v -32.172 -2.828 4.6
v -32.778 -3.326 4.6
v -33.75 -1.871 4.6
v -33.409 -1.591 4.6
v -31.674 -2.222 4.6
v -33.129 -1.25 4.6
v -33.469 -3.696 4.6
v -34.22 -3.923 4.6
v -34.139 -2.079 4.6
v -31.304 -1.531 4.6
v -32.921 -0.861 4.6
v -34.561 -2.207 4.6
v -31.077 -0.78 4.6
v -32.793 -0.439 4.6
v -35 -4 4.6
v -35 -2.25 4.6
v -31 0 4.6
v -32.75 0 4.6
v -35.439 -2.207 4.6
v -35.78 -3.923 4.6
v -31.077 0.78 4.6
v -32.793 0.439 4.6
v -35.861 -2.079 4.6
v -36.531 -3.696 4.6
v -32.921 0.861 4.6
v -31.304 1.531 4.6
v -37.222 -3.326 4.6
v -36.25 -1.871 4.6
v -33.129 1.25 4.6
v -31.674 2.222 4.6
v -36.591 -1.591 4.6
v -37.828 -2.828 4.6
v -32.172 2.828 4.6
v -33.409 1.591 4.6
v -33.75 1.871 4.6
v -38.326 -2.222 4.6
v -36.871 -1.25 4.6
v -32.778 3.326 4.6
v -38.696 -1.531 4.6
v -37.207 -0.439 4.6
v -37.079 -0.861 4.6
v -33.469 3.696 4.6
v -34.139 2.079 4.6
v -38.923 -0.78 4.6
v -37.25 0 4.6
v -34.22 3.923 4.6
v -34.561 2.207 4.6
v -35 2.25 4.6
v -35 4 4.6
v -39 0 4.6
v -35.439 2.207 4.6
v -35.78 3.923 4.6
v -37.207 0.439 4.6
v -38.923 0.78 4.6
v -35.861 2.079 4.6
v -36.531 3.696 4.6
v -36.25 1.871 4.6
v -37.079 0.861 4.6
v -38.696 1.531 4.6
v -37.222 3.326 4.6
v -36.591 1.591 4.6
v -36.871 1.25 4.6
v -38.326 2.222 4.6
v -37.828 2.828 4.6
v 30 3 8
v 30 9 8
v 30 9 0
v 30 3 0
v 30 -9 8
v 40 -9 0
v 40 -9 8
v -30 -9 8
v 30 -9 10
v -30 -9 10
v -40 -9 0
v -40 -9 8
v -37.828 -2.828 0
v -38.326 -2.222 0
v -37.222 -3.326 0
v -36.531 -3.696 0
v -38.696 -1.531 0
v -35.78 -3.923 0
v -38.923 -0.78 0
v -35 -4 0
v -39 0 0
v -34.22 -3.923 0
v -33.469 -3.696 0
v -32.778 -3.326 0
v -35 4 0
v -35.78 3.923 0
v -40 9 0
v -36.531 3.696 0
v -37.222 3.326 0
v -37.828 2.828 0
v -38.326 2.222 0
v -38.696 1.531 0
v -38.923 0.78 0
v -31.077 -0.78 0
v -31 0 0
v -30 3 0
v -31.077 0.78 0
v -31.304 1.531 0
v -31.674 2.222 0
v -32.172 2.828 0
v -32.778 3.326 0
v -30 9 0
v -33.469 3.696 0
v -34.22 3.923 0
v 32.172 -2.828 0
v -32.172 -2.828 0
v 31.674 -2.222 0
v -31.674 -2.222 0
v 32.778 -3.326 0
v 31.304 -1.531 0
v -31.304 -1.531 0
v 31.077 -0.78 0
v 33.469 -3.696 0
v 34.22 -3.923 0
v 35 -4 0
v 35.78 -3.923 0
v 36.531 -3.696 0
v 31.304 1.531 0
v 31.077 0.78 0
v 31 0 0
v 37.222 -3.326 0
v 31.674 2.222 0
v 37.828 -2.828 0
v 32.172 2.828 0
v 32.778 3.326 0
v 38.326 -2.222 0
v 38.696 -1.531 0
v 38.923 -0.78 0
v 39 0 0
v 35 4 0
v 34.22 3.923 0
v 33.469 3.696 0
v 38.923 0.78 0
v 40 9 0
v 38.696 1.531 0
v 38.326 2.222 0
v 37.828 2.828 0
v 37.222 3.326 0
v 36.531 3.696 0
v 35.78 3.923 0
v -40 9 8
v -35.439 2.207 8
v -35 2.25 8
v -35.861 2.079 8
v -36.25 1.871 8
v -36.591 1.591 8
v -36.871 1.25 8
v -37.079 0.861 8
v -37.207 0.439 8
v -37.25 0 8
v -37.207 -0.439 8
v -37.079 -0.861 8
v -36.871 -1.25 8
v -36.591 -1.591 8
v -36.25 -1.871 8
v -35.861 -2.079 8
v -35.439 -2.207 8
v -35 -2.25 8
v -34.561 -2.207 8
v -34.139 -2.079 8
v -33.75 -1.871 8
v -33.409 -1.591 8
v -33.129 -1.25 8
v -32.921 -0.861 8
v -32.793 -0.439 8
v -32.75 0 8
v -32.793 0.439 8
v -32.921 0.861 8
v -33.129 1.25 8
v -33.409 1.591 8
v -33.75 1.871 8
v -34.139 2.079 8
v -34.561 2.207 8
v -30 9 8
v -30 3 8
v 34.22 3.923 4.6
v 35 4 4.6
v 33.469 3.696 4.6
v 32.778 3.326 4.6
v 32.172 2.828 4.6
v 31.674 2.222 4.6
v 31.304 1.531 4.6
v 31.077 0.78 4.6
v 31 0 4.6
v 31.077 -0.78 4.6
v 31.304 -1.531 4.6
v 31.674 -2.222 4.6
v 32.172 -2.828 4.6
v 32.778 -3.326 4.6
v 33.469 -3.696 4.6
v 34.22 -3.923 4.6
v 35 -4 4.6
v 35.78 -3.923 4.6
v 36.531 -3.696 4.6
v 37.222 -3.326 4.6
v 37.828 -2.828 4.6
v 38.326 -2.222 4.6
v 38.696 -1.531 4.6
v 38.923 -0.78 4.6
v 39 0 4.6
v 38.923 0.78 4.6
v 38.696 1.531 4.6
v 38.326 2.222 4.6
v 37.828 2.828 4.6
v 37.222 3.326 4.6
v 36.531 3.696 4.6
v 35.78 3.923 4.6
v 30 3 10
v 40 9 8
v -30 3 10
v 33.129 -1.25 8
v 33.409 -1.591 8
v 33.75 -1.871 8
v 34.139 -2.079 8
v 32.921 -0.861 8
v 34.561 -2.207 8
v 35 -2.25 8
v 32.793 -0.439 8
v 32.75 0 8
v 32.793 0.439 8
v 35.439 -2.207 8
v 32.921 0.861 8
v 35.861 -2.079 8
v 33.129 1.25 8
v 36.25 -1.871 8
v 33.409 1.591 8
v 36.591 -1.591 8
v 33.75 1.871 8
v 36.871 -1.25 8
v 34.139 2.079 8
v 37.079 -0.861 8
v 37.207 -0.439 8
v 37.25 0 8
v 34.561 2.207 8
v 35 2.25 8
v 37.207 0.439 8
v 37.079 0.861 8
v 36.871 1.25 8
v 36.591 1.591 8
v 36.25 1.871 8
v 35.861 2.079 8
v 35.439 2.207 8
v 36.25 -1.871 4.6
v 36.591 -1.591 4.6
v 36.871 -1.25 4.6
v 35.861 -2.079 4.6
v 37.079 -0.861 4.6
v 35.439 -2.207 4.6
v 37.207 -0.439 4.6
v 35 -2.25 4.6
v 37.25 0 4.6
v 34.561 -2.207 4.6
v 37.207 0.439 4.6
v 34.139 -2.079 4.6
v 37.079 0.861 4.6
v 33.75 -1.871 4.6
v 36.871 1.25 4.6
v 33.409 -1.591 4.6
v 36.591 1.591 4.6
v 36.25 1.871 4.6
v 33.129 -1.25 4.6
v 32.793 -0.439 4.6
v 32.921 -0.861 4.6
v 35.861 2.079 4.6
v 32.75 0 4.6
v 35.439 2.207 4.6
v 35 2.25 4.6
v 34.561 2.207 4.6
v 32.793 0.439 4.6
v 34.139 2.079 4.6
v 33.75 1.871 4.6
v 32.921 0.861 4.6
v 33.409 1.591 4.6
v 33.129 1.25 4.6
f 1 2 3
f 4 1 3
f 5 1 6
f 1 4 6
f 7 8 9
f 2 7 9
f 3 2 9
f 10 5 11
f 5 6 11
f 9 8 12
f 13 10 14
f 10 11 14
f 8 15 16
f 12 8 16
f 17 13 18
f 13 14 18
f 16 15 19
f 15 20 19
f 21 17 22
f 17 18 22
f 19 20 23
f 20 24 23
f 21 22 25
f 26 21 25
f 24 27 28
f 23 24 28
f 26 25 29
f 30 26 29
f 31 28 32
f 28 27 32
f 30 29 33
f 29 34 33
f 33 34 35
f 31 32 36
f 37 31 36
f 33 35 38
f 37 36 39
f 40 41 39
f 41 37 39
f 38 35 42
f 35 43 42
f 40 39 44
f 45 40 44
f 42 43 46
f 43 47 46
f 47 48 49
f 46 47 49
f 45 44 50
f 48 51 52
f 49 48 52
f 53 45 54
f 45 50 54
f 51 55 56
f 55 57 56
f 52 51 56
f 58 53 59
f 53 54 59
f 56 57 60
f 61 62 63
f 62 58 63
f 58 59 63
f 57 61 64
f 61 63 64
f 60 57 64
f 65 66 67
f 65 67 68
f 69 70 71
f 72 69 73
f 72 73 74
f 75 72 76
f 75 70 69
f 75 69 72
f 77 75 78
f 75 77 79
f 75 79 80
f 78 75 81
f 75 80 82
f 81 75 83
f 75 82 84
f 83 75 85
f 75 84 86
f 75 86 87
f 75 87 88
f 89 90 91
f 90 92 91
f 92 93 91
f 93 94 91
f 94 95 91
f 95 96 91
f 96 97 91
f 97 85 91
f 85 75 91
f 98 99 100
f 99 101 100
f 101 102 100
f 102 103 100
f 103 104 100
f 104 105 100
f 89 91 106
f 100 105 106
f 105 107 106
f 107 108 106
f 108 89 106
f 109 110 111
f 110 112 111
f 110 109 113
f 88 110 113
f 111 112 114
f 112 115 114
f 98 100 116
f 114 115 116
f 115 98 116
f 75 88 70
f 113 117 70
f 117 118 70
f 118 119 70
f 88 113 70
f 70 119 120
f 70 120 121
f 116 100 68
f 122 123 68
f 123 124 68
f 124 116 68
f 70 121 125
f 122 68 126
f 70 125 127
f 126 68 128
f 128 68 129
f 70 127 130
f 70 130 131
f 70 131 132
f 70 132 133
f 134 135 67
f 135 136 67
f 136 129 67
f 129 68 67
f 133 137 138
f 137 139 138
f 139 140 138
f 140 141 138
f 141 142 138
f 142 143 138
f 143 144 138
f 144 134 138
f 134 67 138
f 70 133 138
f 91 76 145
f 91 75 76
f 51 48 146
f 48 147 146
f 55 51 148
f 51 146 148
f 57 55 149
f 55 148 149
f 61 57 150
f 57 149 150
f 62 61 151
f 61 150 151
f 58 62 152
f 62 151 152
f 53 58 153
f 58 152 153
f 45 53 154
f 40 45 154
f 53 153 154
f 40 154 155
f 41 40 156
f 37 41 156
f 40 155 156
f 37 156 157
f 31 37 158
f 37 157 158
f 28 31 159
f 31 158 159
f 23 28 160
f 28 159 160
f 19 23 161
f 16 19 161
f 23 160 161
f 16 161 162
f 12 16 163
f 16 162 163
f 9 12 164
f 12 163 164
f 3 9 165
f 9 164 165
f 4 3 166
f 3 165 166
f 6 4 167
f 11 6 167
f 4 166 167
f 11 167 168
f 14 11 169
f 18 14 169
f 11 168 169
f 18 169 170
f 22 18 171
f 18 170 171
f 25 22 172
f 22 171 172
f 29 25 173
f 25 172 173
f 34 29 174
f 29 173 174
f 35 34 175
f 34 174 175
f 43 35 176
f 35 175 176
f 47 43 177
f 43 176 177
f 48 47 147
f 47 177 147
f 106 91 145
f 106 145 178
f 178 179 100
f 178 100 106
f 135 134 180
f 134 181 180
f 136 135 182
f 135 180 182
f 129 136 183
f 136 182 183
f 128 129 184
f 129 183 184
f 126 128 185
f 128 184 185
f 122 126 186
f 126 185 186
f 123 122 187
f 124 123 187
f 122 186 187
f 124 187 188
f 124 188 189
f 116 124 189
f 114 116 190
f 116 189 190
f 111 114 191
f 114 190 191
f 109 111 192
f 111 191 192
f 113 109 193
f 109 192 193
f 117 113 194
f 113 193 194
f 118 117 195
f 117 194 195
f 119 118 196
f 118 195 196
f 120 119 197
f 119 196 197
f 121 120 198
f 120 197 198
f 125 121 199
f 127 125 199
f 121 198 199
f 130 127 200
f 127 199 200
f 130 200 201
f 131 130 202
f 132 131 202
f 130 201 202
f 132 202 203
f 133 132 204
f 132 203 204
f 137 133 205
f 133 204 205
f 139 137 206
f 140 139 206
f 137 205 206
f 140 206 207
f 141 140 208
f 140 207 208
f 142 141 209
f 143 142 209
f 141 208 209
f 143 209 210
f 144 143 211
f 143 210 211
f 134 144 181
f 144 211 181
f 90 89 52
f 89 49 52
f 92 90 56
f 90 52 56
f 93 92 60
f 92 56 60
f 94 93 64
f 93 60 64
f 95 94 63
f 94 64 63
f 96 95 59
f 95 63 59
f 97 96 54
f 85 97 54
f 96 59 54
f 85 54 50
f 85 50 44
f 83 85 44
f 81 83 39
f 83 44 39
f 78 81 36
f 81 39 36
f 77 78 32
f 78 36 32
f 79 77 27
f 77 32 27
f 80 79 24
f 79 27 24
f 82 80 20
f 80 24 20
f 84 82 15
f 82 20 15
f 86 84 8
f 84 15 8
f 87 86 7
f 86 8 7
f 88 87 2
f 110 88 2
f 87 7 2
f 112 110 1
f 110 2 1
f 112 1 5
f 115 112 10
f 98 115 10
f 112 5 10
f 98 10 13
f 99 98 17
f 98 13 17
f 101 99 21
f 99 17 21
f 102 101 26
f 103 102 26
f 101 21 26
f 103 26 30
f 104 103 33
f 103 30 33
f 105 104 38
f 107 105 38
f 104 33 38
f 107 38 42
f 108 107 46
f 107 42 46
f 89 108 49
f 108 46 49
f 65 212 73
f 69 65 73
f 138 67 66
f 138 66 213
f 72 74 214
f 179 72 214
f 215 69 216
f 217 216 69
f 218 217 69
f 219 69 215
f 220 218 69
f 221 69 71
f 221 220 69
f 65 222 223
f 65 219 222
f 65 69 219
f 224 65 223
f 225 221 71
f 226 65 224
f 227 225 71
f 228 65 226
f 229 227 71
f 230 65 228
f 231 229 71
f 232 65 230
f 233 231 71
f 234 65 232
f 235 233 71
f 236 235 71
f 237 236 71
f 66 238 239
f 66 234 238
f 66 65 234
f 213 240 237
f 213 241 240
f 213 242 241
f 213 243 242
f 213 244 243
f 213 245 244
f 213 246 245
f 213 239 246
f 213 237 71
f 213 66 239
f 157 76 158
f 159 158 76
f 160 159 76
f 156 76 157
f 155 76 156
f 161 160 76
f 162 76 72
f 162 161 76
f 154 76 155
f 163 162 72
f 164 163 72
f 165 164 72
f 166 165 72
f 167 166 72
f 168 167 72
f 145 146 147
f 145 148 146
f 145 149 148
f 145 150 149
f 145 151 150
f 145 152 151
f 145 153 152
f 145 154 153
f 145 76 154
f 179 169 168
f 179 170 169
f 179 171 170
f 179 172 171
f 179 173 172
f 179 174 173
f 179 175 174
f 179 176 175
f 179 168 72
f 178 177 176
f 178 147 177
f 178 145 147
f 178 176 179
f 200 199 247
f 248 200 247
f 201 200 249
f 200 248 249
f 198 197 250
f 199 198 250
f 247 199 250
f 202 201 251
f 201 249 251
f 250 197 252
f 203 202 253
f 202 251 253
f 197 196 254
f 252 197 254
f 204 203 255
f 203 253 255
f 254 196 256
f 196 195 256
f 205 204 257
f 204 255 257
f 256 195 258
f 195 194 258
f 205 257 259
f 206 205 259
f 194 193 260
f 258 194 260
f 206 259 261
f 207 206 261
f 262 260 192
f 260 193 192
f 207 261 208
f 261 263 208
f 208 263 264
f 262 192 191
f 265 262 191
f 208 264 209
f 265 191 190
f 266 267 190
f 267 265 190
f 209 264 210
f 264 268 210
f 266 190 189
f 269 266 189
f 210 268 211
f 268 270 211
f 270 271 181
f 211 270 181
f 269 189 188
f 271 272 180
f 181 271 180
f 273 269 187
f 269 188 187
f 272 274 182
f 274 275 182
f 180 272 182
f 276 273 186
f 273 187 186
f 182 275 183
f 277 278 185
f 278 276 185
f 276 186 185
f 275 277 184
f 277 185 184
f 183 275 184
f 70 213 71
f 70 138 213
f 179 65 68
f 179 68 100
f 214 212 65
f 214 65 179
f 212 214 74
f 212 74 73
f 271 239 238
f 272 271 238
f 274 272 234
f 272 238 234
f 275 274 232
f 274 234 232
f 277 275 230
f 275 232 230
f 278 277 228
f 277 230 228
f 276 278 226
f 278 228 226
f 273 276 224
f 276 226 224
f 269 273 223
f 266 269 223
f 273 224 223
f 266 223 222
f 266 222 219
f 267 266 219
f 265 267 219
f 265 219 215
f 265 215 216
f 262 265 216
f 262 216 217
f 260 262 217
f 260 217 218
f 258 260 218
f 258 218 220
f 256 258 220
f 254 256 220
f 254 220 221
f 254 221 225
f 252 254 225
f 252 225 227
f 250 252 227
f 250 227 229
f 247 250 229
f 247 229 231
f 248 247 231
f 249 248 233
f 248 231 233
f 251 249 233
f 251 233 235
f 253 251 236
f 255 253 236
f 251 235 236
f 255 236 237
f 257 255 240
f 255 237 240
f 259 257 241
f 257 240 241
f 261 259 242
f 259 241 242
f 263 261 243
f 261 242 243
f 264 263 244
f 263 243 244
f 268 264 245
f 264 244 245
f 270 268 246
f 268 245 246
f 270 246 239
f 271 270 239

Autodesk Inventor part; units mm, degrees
ref_plane "YZ Plane" through (0, 0, 0) normal (1, 0, 0) x (0, 1, 0)
ref_plane "XZ Plane" through (0, 0, 0) normal (0, 1, 0) x (-1, 0, 0)
ref_plane "XY Plane" through (0, 0, 0) normal (0, 0, 1) x (1, 0, 0)
sketch "Skizze1" plane through (0, 0, 0) normal (0, 0, 1) x (1, 0, 0)
  line L0 (-40, 9) -> (40, 9)
  line L1 (40, 9) -> (40, -9)
  line L2 (40, -9) -> (-40, -9)
  line L3 (-40, -9) -> (-40, 9)
  line L4 (-40, 9) -> (40, -9) construction
  line L5 (40, 9) -> (-40, -9) construction
  point P0 (0, 0)
  dimension "Breite" = 80
  dimension "d1" = 18
extrude "Extrusion1" add sketch "Skizze1" along normal blind 10
sketch "Skizze2" plane through (0, 0, 10) normal (0, 0, 1) x (1, 0, 0)
  line L0 (-56, 0) -> (56, 0) projected
  line L1 (0, -12.6) -> (0, 12.6) projected
  line L2 (40, 9) -> (-40, 9) projected
  line L3 (-40, 9) -> (-40, -9) projected
  line L4 (-40, -9) -> (40, -9) projected
  line L5 (40, -9) -> (40, 9) projected
  line L6 (30, 3) -> (-30, 3)
  line L7 (-30, 3) -> (-30, 9)
  line L8 (-30, 9) -> (30, 9)
  line L9 (30, 9) -> (30, 3)
  line L10 (30, 3) -> (-30, 9) construction
  line L11 (-30, 3) -> (30, 9) construction
  point P0 (0, 0)
  point P1 (0, 6)
  dimension "d4" = 60
  dimension "d5" = 6
extrude "Extrusion2" cut sketch "Skizze2" against normal through all contours L6 L7 L2 L1 | L1 L2 L9 L6
sketch "Skizze3" plane through (0, 0, 10) normal (0, 0, 1) x (1, 0, 0)
  line L0 (-30, 9) -> (-40, 9) projected
  line L1 (-30, 9) -> (-40, 9)
  line L2 (-40, 9) -> (-40, -9)
  line L3 (-40, -9) -> (-30, -9)
  line L4 (-30, -9) -> (-30, 9)
  point P0 (0, 0)
extrude "Extrusion3" cut sketch "Skizze3" against normal blind 2
sketch "Skizze4" plane through (0, 0, 10) normal (0, 0, 1) x (1, 0, 0)
  line L0 (40, 9) -> (30, 9)
  line L1 (30, 9) -> (30, -9)
  line L2 (30, -9) -> (40, -9)
  line L3 (40, -9) -> (40, 9)
  point P0 (0, 0)
extrude "Extrusion4" cut sketch "Skizze4" against normal blind 2
sketch "Skizze5" plane through (0, 0, 0) normal (0, 0, -1) x (-1, 0, 0)
  line L0 (0, -12.6) -> (0, 12.6) projected
  line L1 (-30, 9) -> (-40, 9) projected
  point P0 (0, 0)
  point P1 (-35, 0)
  point P2 (35, 0)
  dimension "d12" = 9
hole "Bohrung1" at (35, 0, 0) at (-35, 0, 0) direction (0, 0, 1) diameter 4.5 end through all counterbore diameter 8 counterbore depth 4.6
properties part number "ABI_KastenSchnitt"
